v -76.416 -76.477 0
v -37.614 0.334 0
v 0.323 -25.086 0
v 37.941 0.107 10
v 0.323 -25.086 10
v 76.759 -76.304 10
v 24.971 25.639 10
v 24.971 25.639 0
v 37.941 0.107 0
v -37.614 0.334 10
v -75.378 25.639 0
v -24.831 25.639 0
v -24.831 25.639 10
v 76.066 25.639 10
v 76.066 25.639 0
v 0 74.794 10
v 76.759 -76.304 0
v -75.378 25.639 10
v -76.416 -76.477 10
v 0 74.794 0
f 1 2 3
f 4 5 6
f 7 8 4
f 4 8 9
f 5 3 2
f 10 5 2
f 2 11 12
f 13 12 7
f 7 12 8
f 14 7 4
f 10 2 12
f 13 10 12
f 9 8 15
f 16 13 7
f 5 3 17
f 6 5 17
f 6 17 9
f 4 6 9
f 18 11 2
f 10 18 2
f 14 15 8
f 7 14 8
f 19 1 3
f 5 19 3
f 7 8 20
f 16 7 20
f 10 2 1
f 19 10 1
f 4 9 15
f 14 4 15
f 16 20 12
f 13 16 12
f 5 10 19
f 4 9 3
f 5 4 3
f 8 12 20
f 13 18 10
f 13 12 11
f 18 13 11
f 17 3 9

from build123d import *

# Parameters (mm, degrees)
F1_DEPTH = 10


with BuildPart() as f1:
    # F0 (on Top) → F1 (new body)
    with BuildSketch(Plane.XY):
        Polygon((37.9412560871, 0.1070322484), (0.3225775135, -25.0859522174), (76.758697629, -76.3042420149), align=None)
    extrude(amount=F1_DEPTH)


with BuildPart() as f1b:
    # F0 (on Top) → F1, piece 2 (new body)
    with BuildSketch(Plane.XY):
        Polygon((0.3225775135, -25.0859522174), (-37.6137925374, 0.3344379358), (-76.4160379767, -76.477304101), align=None)
    extrude(amount=F1_DEPTH)


with BuildPart() as f1c:
    # F0 (on Top) → F1, piece 3 (new body)
    with BuildSketch(Plane.XY):
        Polygon((-24.8308423606, 25.6391763687), (-75.3775686026, 25.6391763687), (-37.6137925374, 0.3344379358), align=None)
    extrude(amount=F1_DEPTH)


with BuildPart() as f1d:
    # F0 (on Top) → F1, piece 4 (new body)
    with BuildSketch(Plane.XY):
        Polygon((0, 74.7935548425), (-24.8308423606, 25.6391763687), (24.9707550532, 25.6391763687), align=None)
    extrude(amount=F1_DEPTH)


with BuildPart() as f1e:
    # F0 (on Top) → F1, piece 5 (new body)
    with BuildSketch(Plane.XY):
        Polygon((76.0663747787, 25.6391763687), (24.9707550532, 25.6391763687), (37.9412560871, 0.1070322484), align=None)
    extrude(amount=F1_DEPTH)


solid = Compound([f1.part, f1b.part, f1c.part, f1d.part, f1e.part])
